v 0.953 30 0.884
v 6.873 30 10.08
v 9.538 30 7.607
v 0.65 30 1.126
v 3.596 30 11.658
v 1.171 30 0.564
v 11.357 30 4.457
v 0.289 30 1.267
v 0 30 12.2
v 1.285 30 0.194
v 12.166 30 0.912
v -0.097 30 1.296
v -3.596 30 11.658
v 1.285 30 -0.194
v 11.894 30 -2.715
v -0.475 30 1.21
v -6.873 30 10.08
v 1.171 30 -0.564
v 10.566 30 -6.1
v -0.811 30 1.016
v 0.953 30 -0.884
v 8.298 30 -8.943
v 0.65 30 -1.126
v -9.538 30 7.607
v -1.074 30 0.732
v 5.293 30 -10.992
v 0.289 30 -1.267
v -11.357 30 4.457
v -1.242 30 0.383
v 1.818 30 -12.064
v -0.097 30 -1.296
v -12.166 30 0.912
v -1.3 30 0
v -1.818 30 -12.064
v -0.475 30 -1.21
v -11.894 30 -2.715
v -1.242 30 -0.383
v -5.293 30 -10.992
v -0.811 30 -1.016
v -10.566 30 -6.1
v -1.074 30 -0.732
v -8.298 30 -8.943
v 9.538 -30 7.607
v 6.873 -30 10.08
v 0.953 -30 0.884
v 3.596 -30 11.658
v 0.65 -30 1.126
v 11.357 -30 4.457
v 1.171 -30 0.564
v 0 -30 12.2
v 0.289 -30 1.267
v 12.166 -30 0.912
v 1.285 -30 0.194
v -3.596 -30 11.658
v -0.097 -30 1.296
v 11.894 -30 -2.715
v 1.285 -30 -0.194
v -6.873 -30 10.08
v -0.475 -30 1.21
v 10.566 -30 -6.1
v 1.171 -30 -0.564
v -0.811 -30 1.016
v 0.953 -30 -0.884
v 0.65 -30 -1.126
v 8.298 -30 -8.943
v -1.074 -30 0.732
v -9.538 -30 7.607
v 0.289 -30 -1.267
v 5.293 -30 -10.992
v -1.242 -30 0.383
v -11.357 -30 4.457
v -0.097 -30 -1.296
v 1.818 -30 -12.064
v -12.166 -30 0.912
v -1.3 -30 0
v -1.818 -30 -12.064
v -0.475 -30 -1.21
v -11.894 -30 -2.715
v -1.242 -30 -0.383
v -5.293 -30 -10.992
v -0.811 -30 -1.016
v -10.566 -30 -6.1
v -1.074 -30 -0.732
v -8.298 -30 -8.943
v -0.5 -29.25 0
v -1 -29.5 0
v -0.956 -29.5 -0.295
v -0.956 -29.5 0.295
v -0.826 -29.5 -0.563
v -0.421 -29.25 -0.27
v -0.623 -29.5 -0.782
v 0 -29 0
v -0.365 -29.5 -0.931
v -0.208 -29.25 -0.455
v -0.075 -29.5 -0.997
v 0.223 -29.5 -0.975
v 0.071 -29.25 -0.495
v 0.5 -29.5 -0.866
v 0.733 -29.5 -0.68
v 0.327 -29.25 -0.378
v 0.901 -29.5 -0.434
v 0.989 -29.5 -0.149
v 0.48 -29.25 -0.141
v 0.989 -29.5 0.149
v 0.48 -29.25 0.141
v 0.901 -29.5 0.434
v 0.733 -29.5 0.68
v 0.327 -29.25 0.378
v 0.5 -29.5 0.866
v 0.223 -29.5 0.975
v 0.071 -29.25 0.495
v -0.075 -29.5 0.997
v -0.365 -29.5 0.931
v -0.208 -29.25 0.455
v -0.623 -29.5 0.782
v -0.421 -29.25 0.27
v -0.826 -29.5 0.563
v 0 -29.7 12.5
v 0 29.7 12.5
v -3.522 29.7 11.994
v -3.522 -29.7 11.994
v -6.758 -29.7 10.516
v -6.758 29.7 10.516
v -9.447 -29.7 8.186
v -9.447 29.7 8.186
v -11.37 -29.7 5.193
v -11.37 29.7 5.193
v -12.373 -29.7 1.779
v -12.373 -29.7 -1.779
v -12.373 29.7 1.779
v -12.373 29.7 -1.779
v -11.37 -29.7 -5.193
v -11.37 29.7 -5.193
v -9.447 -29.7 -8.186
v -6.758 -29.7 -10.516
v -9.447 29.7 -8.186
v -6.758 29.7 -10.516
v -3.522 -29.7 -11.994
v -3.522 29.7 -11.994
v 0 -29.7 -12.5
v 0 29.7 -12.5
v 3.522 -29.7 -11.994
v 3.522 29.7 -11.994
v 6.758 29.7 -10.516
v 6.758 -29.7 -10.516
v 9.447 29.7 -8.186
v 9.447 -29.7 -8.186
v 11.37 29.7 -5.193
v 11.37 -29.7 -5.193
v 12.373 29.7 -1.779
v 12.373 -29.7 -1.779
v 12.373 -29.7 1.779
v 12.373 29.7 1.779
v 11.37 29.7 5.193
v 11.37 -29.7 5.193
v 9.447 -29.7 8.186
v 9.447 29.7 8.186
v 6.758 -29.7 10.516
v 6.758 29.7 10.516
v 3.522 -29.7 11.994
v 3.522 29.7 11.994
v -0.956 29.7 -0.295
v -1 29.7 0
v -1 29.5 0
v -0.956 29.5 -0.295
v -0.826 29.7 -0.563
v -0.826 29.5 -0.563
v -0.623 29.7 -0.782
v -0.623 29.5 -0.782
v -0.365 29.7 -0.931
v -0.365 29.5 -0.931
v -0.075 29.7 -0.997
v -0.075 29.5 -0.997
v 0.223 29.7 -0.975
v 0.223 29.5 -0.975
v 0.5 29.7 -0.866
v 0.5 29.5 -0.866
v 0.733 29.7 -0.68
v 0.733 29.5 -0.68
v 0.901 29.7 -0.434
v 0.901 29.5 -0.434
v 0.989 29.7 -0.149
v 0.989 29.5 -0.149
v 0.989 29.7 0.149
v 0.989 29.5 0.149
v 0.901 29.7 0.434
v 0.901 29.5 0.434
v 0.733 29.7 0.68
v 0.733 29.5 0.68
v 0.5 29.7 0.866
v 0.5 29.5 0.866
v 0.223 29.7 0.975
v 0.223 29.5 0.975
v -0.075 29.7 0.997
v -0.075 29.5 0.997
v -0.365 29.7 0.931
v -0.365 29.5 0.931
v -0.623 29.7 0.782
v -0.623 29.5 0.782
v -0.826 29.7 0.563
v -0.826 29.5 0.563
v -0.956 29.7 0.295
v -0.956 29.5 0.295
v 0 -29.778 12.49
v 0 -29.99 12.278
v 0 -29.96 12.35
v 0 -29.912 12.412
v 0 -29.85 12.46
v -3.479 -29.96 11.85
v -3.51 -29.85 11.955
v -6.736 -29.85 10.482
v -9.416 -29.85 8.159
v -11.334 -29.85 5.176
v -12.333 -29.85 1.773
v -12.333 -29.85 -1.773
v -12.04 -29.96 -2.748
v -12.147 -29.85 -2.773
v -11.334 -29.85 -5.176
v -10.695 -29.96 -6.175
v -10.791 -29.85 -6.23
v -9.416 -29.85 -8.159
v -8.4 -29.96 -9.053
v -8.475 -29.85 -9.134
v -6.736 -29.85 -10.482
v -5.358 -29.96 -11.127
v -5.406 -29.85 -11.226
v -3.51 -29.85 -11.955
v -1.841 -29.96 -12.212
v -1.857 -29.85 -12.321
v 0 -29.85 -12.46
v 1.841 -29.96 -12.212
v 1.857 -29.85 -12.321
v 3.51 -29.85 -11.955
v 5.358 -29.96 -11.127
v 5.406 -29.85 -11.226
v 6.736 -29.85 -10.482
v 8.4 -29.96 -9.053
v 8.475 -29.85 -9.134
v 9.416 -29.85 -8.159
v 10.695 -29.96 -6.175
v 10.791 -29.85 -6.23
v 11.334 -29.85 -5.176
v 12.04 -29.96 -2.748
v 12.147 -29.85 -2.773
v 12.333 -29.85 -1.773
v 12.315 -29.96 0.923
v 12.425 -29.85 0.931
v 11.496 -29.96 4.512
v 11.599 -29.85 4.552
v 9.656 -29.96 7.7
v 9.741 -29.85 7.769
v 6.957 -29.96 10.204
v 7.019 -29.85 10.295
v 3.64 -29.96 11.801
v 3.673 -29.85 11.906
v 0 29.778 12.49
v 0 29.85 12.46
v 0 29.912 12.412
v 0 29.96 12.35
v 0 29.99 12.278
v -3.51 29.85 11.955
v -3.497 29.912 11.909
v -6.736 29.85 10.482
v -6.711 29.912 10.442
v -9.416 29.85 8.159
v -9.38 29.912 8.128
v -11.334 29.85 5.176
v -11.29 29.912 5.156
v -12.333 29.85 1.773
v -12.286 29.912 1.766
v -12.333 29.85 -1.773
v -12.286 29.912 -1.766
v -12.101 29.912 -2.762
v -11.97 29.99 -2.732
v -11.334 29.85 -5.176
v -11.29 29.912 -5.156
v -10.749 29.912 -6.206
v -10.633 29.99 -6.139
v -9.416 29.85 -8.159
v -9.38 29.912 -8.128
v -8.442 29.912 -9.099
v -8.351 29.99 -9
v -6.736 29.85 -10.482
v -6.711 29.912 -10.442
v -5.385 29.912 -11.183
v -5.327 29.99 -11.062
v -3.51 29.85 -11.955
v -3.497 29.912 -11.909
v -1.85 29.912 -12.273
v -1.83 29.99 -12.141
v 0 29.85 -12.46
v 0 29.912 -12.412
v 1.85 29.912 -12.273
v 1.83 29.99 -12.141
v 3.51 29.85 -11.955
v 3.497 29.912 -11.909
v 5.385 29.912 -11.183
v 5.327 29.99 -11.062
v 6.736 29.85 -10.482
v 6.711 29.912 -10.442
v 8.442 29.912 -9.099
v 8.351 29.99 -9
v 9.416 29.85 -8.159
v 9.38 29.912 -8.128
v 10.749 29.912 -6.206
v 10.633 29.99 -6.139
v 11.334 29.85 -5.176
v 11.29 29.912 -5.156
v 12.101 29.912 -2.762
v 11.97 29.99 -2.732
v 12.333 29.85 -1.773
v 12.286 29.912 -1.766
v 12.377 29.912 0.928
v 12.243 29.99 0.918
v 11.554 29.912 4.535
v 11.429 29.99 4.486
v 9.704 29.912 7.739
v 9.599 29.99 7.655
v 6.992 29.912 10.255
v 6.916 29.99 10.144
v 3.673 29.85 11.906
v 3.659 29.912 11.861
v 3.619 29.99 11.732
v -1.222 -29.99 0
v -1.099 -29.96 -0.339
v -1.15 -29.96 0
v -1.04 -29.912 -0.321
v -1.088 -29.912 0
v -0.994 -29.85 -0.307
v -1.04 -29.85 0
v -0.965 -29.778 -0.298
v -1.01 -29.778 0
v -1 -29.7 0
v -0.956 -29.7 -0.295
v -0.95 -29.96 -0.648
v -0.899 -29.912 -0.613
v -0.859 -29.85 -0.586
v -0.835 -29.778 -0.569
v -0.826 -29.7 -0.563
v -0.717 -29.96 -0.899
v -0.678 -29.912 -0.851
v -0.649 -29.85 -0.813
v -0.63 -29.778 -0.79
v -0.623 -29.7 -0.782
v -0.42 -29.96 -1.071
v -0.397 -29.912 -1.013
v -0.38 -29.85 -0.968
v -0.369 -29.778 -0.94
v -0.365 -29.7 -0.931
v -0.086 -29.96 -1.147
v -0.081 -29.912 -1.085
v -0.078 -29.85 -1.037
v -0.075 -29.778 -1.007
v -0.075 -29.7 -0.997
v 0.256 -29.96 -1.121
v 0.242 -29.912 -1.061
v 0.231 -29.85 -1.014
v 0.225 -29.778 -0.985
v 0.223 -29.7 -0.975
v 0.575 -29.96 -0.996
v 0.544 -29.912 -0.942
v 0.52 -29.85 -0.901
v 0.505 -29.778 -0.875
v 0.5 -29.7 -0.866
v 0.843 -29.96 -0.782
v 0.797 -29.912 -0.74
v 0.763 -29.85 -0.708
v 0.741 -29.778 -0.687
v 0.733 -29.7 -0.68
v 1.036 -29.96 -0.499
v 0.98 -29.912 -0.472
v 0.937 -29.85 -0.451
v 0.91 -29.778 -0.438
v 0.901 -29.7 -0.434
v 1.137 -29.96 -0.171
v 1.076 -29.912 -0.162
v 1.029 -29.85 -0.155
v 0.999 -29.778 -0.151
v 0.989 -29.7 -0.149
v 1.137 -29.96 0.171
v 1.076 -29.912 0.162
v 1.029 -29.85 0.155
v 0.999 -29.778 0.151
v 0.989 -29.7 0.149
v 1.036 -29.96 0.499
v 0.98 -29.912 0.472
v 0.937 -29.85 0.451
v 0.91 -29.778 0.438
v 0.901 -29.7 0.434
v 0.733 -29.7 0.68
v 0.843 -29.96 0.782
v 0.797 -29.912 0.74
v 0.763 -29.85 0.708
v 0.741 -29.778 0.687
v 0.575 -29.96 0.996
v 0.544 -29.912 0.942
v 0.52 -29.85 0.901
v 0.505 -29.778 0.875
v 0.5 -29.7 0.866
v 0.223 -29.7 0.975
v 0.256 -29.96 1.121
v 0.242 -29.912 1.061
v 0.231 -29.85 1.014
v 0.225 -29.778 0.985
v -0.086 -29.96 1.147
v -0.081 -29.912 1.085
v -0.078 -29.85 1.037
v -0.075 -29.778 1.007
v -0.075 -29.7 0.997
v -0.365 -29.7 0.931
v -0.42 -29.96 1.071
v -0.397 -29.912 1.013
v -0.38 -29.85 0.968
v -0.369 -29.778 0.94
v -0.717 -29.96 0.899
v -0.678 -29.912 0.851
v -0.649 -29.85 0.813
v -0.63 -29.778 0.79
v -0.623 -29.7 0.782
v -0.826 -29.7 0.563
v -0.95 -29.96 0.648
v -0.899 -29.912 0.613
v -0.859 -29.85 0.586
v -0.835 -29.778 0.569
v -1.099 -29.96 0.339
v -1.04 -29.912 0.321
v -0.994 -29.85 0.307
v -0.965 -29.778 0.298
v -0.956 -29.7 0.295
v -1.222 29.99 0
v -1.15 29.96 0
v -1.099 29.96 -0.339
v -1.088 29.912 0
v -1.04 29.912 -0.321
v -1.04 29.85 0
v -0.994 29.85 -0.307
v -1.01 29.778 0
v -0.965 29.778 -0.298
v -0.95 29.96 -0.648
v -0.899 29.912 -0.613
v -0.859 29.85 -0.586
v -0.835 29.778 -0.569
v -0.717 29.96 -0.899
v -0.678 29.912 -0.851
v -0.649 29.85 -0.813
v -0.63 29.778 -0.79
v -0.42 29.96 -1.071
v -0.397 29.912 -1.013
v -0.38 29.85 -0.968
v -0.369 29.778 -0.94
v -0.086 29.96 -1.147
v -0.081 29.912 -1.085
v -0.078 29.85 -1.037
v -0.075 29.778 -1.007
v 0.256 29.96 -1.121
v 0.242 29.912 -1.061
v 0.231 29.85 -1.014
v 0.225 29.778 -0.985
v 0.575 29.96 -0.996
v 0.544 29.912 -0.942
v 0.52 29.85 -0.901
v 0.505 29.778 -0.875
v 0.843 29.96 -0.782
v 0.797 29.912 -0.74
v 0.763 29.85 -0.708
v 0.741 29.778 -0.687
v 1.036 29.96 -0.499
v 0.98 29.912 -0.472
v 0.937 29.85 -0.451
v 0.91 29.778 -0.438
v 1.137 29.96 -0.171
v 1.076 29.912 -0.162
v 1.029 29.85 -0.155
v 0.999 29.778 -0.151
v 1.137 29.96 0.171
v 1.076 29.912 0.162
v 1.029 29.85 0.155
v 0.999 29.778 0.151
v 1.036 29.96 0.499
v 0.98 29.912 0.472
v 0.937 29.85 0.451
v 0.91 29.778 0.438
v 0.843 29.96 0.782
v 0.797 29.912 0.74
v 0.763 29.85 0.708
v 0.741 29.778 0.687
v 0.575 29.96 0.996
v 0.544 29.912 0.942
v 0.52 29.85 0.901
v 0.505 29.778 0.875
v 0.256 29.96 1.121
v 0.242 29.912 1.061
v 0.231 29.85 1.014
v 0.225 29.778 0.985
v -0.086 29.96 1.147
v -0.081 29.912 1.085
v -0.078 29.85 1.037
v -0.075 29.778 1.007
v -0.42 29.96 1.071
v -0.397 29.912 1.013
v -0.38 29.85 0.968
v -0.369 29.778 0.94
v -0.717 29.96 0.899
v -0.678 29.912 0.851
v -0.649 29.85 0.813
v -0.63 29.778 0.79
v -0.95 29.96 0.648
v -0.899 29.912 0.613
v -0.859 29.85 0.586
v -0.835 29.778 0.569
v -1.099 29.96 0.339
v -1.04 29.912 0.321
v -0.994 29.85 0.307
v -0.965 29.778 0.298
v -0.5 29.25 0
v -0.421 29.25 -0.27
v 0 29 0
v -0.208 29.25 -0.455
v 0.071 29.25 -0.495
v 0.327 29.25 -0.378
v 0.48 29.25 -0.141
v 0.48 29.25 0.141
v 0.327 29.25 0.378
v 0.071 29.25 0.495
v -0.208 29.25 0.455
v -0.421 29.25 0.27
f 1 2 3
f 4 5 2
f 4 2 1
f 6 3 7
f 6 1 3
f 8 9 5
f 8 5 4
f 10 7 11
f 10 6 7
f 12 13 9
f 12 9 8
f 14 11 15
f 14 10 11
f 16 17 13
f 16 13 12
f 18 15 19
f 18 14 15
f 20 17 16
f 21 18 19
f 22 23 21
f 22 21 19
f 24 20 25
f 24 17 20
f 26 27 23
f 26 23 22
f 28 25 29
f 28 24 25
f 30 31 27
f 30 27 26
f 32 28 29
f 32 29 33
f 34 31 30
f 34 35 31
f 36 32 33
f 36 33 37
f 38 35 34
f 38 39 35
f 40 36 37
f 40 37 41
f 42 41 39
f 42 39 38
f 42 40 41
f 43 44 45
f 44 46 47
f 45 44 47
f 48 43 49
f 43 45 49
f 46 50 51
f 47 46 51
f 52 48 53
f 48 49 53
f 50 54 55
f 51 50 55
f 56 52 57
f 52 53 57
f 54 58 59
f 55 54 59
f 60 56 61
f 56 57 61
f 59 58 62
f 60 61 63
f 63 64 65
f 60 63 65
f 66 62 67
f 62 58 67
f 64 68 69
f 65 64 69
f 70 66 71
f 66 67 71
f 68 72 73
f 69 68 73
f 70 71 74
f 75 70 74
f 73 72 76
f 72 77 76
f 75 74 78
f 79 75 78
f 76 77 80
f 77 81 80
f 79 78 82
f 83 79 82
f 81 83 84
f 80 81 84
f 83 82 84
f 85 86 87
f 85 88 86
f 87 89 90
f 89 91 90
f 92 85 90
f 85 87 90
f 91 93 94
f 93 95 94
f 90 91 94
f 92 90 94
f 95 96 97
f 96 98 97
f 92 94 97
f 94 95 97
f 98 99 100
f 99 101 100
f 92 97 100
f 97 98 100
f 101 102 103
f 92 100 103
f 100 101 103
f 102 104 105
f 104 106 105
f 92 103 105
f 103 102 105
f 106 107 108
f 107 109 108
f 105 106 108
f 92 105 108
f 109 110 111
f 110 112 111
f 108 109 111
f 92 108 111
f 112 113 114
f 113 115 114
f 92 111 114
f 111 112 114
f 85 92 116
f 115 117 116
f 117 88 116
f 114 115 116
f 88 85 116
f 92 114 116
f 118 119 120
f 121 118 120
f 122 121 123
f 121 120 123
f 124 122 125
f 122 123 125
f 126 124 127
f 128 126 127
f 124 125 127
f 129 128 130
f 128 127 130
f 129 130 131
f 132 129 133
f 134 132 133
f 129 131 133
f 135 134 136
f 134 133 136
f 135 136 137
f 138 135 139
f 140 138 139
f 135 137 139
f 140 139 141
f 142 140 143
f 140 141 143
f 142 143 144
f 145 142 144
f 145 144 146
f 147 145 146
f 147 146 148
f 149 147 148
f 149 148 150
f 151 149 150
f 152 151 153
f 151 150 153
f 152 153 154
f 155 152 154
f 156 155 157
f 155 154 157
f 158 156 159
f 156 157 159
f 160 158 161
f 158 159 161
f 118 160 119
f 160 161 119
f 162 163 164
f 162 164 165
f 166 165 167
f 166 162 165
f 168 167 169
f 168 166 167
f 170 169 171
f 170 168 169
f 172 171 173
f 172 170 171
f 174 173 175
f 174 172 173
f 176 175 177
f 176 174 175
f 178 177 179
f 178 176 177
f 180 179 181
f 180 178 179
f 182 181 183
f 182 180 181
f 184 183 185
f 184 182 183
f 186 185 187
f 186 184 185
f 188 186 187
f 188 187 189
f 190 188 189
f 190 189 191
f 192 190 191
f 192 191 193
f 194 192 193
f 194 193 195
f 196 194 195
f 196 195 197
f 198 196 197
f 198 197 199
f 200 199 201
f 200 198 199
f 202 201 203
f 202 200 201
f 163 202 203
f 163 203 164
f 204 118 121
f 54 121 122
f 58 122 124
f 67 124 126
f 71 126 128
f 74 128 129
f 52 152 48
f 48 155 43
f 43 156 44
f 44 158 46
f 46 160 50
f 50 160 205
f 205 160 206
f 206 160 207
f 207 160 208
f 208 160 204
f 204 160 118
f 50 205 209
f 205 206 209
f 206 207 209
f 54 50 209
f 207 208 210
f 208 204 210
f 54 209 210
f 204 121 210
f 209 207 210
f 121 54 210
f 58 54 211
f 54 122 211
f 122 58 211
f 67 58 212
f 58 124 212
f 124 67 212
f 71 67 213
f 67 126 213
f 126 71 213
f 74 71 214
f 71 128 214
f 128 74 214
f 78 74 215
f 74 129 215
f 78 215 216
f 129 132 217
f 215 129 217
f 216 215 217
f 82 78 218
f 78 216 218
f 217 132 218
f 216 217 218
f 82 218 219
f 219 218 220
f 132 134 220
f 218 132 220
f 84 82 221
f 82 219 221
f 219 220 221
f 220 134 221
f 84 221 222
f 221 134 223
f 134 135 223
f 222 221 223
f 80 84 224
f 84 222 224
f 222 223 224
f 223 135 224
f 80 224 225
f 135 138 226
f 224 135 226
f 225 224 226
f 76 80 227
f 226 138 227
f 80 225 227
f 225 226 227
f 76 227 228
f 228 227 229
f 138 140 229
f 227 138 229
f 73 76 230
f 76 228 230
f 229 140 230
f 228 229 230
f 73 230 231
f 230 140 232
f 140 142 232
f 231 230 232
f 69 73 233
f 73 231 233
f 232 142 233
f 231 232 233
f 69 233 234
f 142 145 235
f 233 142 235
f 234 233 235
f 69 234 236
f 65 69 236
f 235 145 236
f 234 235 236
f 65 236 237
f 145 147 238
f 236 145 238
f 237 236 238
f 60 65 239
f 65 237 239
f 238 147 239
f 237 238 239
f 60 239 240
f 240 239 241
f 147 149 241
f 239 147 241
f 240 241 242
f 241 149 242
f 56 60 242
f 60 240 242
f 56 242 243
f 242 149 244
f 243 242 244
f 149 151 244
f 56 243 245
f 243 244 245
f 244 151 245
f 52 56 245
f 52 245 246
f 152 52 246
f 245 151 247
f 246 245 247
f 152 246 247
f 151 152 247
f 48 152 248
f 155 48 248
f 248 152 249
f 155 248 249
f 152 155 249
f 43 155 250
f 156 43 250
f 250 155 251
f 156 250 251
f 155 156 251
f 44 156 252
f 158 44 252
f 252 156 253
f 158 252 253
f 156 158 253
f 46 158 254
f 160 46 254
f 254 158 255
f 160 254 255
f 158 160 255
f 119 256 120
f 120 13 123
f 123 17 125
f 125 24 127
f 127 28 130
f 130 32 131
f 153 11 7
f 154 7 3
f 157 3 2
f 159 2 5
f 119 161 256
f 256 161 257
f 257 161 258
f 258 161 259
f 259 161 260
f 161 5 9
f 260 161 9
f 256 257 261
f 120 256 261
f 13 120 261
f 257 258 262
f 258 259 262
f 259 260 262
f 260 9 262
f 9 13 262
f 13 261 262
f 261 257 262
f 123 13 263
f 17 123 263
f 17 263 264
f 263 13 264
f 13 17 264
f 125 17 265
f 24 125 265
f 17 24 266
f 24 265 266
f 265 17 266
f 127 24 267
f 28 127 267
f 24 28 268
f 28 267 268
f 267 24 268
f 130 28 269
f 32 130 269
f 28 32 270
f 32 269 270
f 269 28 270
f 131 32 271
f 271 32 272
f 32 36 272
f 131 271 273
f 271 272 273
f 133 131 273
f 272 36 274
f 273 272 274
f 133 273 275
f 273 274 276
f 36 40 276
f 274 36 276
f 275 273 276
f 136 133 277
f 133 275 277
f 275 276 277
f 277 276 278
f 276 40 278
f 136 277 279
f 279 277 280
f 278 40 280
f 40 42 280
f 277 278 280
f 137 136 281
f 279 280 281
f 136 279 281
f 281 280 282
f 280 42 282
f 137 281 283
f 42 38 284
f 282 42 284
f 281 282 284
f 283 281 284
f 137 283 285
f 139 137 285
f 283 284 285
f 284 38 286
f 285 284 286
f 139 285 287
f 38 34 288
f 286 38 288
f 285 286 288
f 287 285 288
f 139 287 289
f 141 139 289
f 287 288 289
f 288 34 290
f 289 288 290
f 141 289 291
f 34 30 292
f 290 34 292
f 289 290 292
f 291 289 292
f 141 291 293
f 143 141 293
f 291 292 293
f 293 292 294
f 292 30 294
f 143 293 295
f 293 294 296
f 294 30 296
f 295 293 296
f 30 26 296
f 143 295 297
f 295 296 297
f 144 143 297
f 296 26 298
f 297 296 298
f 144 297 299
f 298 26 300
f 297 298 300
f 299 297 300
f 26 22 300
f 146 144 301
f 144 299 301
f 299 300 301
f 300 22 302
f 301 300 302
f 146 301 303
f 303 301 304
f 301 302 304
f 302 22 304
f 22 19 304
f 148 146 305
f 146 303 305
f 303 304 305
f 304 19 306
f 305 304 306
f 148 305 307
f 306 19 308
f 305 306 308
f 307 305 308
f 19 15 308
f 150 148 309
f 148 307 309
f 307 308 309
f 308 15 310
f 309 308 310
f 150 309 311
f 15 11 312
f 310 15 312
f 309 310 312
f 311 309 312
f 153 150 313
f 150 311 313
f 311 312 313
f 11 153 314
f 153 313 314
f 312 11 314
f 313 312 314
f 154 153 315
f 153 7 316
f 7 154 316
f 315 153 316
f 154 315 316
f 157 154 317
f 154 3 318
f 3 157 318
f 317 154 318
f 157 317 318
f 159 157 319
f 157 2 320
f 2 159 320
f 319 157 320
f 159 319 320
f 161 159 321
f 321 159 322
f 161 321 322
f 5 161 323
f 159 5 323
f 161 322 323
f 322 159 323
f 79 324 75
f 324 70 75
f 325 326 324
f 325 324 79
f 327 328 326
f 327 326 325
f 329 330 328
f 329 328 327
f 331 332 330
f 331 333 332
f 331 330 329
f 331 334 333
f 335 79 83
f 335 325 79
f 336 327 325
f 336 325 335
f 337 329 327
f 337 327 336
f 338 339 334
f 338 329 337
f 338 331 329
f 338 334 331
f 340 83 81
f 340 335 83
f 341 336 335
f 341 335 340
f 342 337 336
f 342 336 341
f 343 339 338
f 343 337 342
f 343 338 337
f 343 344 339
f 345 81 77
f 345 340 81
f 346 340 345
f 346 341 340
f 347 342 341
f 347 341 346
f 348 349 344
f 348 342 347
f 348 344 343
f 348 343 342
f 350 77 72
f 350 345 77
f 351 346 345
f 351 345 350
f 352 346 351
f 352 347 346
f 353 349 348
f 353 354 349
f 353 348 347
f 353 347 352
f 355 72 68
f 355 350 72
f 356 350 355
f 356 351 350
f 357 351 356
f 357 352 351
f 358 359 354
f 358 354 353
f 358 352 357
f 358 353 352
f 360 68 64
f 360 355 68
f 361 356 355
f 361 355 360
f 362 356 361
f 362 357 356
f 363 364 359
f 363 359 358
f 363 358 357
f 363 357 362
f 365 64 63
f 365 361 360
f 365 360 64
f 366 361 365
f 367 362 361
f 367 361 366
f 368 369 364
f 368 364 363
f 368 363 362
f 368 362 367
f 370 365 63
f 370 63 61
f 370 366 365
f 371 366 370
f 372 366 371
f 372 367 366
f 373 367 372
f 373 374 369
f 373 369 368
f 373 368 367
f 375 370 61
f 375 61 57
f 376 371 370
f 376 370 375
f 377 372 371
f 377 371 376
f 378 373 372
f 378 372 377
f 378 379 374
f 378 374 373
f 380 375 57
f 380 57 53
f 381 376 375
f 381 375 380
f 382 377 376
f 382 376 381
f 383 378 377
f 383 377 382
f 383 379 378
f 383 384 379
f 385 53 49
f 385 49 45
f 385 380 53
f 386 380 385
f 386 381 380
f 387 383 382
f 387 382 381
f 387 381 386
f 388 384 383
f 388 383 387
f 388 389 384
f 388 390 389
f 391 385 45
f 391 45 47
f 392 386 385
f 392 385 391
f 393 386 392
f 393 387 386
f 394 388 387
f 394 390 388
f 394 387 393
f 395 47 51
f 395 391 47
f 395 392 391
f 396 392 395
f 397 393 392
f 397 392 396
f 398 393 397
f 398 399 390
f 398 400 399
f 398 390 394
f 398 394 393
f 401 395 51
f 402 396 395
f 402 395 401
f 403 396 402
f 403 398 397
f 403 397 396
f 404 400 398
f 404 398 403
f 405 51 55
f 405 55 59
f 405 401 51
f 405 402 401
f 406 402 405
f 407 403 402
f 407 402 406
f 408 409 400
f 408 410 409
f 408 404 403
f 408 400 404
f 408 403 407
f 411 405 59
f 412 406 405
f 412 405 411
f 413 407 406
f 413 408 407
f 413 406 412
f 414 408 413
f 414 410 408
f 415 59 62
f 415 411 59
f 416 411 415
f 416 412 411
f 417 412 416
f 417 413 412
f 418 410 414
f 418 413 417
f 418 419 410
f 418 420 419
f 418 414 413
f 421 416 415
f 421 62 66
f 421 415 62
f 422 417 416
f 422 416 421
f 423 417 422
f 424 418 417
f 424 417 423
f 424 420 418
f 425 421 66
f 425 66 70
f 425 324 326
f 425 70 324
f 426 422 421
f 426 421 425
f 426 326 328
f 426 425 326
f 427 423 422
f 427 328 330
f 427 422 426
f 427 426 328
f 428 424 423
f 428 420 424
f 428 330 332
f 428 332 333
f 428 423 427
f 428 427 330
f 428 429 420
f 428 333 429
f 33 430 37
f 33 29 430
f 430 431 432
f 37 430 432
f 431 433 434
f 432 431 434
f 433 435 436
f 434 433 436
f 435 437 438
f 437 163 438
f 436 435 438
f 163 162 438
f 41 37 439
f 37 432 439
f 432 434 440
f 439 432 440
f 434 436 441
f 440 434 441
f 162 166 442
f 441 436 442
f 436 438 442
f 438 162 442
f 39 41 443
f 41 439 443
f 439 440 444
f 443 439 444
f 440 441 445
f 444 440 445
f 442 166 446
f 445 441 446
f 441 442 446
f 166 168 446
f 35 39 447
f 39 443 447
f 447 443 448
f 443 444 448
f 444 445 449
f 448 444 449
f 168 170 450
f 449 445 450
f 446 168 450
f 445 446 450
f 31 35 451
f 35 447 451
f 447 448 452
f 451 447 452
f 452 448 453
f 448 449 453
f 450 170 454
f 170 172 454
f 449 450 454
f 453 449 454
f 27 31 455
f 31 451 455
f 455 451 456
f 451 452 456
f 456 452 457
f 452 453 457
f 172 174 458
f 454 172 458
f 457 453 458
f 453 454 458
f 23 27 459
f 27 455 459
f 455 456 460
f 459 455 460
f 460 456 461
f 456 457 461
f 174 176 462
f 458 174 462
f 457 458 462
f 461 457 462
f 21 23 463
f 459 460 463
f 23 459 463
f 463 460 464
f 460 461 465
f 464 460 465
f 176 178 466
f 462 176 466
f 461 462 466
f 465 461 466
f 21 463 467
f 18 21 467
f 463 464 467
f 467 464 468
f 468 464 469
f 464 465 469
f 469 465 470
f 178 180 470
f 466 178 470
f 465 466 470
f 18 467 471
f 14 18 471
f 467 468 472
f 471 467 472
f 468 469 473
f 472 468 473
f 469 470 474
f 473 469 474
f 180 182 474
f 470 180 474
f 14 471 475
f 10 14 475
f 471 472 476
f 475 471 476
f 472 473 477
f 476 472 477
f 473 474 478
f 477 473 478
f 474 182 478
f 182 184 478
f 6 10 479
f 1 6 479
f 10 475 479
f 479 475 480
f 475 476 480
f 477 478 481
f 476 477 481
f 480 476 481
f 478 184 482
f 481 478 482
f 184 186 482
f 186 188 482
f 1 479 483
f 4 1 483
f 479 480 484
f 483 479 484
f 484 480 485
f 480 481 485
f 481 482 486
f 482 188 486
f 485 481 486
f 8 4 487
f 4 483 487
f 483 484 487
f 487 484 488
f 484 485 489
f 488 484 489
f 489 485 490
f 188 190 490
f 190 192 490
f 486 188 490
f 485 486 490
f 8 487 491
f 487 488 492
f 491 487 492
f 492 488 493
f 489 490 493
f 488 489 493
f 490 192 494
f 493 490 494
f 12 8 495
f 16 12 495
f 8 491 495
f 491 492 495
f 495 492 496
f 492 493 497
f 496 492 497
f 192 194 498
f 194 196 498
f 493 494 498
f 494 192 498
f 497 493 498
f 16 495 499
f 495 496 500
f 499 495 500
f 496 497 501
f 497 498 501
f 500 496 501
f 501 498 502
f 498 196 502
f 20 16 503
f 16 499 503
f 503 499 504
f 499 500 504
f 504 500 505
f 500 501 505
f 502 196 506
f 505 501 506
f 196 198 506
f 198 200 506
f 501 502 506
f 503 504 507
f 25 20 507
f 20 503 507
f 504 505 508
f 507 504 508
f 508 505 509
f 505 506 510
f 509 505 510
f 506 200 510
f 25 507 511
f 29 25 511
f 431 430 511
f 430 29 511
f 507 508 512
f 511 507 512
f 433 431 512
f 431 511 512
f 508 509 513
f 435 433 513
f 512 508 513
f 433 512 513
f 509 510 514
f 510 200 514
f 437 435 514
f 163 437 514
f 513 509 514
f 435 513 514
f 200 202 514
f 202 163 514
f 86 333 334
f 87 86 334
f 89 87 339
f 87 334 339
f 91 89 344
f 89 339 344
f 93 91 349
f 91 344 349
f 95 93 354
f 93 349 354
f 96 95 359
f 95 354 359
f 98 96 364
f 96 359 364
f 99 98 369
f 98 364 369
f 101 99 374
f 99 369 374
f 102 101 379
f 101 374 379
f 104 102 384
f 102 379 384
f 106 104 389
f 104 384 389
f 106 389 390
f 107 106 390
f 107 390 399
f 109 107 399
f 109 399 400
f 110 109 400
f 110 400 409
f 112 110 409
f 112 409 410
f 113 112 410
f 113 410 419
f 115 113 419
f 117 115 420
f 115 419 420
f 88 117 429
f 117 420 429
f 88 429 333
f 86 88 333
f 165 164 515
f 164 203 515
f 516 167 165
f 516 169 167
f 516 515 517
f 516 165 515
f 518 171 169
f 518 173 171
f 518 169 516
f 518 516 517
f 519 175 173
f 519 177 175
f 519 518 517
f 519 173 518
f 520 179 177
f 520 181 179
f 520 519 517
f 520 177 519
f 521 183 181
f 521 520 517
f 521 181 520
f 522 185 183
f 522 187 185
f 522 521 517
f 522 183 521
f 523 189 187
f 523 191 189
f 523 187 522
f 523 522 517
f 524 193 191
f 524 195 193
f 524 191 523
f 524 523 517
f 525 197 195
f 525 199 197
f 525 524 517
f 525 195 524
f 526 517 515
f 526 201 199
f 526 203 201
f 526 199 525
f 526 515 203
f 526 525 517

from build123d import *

# Parameters (mm, degrees)
SKETCH2_W = 12.5
SKETCH2_H = 60
FILLET1_R = 0.3


with BuildPart() as part:
    # Sketch2 → Revolve1 (revolve)
    with BuildSketch(Plane.XY, mode=Mode.PRIVATE) as revolve1_sk:
        with Locations((6.25, 0)):
            Rectangle(SKETCH2_W, SKETCH2_H)
    revolve(revolve1_sk.sketch.rotate(Axis((0, 30, 0), (0, -1, 0)), 90), axis=Axis((0, 30, 0), (0, -1, 0)))

    # Sketch4 → Cut-Revolve1 (revolve, cut)
    with BuildSketch(Plane.XY, mode=Mode.PRIVATE) as cut_revolve1_sk:
        Polygon((0, 30), (0, 29), (1, 29.5), (1, 30), align=None)
    cut_revolve1 = revolve(cut_revolve1_sk.sketch.rotate(Axis((0, 30, 0), (0, -1, 0)), 180), axis=Axis((0, 30, 0), (0, -1, 0)), mode=Mode.SUBTRACT)

    # Mirror2: Cut-Revolve1 across plane
    add(cut_revolve1.mirror(Plane.ZX), mode=Mode.SUBTRACT)

    # Fillet1
    fillet1_edges = [part.edges().sort_by_distance(p)[0] for p in [
        (1, -30, 0),
        (0, -30, -12.5),
        (0, 30, -12.5),
        (1, 30, 0),
    ]]
    fillet(fillet1_edges, radius=FILLET1_R)


solid = part.part
